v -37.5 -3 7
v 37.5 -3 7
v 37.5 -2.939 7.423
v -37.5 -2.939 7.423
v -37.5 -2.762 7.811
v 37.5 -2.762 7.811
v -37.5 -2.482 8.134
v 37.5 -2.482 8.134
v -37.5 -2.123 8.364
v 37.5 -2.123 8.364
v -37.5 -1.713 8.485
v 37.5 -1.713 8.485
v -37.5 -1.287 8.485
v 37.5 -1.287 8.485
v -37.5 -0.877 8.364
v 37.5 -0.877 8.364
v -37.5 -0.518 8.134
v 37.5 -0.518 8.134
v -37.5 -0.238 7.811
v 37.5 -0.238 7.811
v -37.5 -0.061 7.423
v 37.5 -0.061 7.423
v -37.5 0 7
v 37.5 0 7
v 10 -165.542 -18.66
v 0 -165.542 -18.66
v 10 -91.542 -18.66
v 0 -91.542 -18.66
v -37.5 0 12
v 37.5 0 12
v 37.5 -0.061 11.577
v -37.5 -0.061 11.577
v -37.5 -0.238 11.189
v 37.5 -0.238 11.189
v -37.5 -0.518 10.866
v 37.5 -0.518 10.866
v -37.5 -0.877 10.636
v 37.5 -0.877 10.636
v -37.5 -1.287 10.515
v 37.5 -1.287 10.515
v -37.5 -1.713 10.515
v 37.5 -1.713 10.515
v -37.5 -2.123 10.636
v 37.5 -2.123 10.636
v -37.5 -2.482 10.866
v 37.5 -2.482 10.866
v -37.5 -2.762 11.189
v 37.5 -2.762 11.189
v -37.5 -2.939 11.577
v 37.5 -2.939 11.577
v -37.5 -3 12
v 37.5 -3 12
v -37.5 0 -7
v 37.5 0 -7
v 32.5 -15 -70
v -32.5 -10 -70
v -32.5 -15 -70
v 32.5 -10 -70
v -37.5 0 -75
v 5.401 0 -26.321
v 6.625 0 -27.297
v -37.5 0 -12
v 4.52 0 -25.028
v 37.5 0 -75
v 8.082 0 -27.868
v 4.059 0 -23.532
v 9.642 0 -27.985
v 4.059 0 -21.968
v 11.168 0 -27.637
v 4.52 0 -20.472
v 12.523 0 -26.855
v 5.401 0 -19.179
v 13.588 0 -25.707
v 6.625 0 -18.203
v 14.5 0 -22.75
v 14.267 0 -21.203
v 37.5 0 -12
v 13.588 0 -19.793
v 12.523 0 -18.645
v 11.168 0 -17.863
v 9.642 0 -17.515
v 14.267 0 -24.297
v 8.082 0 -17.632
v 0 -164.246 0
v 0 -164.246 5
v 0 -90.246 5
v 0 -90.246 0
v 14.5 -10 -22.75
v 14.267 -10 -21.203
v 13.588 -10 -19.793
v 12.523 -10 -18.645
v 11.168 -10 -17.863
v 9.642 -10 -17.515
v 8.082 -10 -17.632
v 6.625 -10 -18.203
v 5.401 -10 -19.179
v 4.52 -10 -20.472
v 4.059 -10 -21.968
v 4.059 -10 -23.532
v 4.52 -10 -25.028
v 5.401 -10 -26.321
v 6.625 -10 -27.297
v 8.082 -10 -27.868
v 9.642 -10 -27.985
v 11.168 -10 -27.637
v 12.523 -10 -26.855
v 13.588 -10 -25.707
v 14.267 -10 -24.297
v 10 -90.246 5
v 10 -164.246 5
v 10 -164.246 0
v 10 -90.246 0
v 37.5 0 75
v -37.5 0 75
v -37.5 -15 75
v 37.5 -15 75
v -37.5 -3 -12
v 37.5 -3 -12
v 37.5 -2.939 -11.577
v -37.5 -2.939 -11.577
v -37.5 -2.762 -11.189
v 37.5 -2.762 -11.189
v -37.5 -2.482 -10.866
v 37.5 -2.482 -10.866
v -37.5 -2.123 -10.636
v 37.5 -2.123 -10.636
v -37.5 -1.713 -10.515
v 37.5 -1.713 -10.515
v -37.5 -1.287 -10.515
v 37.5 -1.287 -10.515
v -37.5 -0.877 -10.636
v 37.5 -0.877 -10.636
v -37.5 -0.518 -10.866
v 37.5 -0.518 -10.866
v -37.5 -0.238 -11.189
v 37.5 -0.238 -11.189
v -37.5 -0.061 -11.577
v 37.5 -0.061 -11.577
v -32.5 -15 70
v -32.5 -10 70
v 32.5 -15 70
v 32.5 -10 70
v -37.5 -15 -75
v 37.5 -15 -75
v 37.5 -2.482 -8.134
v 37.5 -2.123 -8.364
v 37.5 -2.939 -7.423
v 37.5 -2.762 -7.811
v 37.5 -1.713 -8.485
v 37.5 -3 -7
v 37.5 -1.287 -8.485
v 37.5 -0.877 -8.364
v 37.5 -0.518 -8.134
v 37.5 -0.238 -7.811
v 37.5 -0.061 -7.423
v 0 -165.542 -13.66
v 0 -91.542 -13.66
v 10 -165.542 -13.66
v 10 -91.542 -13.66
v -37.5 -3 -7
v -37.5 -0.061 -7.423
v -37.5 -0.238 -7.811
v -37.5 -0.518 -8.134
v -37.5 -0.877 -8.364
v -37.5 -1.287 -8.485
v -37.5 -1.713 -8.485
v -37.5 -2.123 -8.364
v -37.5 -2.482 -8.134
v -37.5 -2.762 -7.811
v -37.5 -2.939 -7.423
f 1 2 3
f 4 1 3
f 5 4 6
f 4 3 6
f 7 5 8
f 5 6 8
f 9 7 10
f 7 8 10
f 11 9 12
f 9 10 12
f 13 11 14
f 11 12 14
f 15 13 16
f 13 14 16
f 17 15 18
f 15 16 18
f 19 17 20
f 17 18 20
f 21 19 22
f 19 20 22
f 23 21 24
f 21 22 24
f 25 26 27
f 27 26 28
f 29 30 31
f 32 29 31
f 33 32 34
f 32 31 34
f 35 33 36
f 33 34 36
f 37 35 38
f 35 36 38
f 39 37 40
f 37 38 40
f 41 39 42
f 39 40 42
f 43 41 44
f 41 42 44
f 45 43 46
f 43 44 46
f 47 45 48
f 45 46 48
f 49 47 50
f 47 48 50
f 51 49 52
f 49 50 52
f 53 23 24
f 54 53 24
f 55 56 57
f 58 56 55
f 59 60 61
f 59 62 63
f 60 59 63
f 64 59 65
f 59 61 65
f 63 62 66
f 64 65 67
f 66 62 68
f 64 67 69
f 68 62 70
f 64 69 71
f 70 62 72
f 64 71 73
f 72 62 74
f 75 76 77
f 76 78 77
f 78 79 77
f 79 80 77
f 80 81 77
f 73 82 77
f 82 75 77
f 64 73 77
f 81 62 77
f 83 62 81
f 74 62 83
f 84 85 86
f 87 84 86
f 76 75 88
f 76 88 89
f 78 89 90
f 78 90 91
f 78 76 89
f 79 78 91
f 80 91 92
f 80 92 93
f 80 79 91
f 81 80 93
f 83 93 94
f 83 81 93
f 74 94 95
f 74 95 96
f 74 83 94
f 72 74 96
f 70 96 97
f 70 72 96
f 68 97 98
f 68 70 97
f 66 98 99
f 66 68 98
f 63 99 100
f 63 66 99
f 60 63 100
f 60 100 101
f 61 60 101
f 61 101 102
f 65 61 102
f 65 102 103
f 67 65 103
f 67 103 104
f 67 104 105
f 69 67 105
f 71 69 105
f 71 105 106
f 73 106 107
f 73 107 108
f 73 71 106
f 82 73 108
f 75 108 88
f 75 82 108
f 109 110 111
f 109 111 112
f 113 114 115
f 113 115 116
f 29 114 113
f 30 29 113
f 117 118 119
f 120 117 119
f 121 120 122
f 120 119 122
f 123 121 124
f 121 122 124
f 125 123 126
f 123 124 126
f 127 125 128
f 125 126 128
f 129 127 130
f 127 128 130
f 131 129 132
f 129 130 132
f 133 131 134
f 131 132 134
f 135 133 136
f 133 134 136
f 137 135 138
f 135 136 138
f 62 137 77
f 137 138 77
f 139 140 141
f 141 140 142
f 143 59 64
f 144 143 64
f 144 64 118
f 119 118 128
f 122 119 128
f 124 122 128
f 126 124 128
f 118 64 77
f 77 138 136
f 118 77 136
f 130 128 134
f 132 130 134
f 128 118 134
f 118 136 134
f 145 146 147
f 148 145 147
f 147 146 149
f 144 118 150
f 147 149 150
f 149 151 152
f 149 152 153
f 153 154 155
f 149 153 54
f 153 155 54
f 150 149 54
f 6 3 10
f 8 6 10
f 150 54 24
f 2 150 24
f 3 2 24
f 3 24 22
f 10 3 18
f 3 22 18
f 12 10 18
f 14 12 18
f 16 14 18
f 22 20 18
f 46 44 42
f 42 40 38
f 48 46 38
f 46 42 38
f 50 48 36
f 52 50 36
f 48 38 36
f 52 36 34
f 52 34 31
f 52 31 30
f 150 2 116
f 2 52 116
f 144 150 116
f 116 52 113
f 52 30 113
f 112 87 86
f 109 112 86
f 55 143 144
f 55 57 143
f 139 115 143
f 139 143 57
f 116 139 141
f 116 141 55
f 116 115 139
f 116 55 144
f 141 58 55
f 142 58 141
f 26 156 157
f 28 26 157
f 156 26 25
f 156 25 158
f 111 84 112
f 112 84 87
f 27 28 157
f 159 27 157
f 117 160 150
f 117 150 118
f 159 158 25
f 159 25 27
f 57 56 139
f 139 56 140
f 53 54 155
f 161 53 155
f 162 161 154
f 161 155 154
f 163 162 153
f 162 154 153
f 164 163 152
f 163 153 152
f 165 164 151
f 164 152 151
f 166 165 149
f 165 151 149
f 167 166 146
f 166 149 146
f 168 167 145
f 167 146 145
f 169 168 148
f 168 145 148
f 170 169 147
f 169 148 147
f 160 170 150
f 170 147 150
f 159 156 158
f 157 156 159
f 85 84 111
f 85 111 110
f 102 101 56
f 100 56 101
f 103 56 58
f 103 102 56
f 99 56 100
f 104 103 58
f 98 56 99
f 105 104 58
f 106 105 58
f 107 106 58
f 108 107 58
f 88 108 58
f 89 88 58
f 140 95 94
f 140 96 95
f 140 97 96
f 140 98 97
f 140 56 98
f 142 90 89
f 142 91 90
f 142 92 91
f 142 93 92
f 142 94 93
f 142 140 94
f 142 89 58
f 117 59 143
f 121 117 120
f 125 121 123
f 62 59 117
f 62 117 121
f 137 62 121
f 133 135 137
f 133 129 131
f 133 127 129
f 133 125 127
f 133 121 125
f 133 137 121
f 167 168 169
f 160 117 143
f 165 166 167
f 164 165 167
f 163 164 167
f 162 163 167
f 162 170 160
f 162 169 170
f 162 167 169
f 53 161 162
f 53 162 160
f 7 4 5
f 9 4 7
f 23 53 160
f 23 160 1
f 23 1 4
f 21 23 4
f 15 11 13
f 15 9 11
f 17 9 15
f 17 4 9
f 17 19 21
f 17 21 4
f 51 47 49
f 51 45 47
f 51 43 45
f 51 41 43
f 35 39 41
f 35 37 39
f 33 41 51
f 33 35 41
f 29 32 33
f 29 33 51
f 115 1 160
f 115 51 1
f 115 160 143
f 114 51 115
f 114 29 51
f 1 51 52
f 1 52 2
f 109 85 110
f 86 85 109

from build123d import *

# Parameters (mm, degrees)
F0_W          = 75
F0_H          = 150
F0_W_2        = 65
F0_H_2        = 140
F1_DEPTH      = 15
F0_R          = 5.25
F2_DEPTH      = 10
F3_W          = 74
F3_H          = 5
F4_DEPTH      = 10
F5_DEPTH      = 37.501
F5_DEPTH_BACK = 37.501


with BuildPart() as f1:
    # F0 (on Front) → F1 (new body)
    with BuildSketch(Plane.XZ):
        Rectangle(F0_W, F0_H)
        Rectangle(F0_W_2, F0_H_2, mode=Mode.SUBTRACT)
    extrude(amount=F1_DEPTH)

    # F0 (on Front) → F2 (join)
    with BuildSketch(Plane.XZ):
        Rectangle(F0_W_2, F0_H_2)
        with Locations((9.25, -22.75)):
            Circle(F0_R, mode=Mode.SUBTRACT)
    extrude(amount=F2_DEPTH)

    # F3 (on Right) → F5 (cut, two sides)
    with BuildSketch(Plane.YZ) as f5_sk:
        with Locations((-127.245810883, 2.5)):
            Rectangle(F3_W, F3_H)
        with Locations((-128.5421704054, -16.1596382409)):
            Rectangle(F3_W, F3_H)
        with BuildLine():
            Line((0, -12), (0, -7))
            ThreePointArc((0, -7), (-1.5, -8.5), (-3, -7))
            Line((-3, -7), (-3, -12))
            ThreePointArc((-3, -12), (-1.5, -10.5), (0, -12))
        make_face()
        with BuildLine():
            ThreePointArc((0, 12), (-1.5, 10.5), (-3, 12))
            Line((-3, 12), (-3, 7))
            ThreePointArc((-3, 7), (-1.5, 8.5), (0, 7))
            Line((0, 7), (0, 12))
        make_face()
    extrude(amount=F5_DEPTH, mode=Mode.SUBTRACT)
    extrude(f5_sk.sketch, amount=-F5_DEPTH_BACK, mode=Mode.SUBTRACT)


with BuildPart() as f4:
    # F3 (on Right) → F4 (new body)
    with BuildSketch(Plane.YZ):
        with Locations((-127.245810883, 2.5)):
            Rectangle(F3_W, F3_H)
    extrude(amount=F4_DEPTH)


with BuildPart() as f4b:
    # F3 (on Right) → F4, piece 2 (new body)
    with BuildSketch(Plane.YZ):
        with Locations((-128.5421704054, -16.1596382409)):
            Rectangle(F3_W, F3_H)
    extrude(amount=F4_DEPTH)


solid = Compound([f1.part, f4.part, f4b.part])
